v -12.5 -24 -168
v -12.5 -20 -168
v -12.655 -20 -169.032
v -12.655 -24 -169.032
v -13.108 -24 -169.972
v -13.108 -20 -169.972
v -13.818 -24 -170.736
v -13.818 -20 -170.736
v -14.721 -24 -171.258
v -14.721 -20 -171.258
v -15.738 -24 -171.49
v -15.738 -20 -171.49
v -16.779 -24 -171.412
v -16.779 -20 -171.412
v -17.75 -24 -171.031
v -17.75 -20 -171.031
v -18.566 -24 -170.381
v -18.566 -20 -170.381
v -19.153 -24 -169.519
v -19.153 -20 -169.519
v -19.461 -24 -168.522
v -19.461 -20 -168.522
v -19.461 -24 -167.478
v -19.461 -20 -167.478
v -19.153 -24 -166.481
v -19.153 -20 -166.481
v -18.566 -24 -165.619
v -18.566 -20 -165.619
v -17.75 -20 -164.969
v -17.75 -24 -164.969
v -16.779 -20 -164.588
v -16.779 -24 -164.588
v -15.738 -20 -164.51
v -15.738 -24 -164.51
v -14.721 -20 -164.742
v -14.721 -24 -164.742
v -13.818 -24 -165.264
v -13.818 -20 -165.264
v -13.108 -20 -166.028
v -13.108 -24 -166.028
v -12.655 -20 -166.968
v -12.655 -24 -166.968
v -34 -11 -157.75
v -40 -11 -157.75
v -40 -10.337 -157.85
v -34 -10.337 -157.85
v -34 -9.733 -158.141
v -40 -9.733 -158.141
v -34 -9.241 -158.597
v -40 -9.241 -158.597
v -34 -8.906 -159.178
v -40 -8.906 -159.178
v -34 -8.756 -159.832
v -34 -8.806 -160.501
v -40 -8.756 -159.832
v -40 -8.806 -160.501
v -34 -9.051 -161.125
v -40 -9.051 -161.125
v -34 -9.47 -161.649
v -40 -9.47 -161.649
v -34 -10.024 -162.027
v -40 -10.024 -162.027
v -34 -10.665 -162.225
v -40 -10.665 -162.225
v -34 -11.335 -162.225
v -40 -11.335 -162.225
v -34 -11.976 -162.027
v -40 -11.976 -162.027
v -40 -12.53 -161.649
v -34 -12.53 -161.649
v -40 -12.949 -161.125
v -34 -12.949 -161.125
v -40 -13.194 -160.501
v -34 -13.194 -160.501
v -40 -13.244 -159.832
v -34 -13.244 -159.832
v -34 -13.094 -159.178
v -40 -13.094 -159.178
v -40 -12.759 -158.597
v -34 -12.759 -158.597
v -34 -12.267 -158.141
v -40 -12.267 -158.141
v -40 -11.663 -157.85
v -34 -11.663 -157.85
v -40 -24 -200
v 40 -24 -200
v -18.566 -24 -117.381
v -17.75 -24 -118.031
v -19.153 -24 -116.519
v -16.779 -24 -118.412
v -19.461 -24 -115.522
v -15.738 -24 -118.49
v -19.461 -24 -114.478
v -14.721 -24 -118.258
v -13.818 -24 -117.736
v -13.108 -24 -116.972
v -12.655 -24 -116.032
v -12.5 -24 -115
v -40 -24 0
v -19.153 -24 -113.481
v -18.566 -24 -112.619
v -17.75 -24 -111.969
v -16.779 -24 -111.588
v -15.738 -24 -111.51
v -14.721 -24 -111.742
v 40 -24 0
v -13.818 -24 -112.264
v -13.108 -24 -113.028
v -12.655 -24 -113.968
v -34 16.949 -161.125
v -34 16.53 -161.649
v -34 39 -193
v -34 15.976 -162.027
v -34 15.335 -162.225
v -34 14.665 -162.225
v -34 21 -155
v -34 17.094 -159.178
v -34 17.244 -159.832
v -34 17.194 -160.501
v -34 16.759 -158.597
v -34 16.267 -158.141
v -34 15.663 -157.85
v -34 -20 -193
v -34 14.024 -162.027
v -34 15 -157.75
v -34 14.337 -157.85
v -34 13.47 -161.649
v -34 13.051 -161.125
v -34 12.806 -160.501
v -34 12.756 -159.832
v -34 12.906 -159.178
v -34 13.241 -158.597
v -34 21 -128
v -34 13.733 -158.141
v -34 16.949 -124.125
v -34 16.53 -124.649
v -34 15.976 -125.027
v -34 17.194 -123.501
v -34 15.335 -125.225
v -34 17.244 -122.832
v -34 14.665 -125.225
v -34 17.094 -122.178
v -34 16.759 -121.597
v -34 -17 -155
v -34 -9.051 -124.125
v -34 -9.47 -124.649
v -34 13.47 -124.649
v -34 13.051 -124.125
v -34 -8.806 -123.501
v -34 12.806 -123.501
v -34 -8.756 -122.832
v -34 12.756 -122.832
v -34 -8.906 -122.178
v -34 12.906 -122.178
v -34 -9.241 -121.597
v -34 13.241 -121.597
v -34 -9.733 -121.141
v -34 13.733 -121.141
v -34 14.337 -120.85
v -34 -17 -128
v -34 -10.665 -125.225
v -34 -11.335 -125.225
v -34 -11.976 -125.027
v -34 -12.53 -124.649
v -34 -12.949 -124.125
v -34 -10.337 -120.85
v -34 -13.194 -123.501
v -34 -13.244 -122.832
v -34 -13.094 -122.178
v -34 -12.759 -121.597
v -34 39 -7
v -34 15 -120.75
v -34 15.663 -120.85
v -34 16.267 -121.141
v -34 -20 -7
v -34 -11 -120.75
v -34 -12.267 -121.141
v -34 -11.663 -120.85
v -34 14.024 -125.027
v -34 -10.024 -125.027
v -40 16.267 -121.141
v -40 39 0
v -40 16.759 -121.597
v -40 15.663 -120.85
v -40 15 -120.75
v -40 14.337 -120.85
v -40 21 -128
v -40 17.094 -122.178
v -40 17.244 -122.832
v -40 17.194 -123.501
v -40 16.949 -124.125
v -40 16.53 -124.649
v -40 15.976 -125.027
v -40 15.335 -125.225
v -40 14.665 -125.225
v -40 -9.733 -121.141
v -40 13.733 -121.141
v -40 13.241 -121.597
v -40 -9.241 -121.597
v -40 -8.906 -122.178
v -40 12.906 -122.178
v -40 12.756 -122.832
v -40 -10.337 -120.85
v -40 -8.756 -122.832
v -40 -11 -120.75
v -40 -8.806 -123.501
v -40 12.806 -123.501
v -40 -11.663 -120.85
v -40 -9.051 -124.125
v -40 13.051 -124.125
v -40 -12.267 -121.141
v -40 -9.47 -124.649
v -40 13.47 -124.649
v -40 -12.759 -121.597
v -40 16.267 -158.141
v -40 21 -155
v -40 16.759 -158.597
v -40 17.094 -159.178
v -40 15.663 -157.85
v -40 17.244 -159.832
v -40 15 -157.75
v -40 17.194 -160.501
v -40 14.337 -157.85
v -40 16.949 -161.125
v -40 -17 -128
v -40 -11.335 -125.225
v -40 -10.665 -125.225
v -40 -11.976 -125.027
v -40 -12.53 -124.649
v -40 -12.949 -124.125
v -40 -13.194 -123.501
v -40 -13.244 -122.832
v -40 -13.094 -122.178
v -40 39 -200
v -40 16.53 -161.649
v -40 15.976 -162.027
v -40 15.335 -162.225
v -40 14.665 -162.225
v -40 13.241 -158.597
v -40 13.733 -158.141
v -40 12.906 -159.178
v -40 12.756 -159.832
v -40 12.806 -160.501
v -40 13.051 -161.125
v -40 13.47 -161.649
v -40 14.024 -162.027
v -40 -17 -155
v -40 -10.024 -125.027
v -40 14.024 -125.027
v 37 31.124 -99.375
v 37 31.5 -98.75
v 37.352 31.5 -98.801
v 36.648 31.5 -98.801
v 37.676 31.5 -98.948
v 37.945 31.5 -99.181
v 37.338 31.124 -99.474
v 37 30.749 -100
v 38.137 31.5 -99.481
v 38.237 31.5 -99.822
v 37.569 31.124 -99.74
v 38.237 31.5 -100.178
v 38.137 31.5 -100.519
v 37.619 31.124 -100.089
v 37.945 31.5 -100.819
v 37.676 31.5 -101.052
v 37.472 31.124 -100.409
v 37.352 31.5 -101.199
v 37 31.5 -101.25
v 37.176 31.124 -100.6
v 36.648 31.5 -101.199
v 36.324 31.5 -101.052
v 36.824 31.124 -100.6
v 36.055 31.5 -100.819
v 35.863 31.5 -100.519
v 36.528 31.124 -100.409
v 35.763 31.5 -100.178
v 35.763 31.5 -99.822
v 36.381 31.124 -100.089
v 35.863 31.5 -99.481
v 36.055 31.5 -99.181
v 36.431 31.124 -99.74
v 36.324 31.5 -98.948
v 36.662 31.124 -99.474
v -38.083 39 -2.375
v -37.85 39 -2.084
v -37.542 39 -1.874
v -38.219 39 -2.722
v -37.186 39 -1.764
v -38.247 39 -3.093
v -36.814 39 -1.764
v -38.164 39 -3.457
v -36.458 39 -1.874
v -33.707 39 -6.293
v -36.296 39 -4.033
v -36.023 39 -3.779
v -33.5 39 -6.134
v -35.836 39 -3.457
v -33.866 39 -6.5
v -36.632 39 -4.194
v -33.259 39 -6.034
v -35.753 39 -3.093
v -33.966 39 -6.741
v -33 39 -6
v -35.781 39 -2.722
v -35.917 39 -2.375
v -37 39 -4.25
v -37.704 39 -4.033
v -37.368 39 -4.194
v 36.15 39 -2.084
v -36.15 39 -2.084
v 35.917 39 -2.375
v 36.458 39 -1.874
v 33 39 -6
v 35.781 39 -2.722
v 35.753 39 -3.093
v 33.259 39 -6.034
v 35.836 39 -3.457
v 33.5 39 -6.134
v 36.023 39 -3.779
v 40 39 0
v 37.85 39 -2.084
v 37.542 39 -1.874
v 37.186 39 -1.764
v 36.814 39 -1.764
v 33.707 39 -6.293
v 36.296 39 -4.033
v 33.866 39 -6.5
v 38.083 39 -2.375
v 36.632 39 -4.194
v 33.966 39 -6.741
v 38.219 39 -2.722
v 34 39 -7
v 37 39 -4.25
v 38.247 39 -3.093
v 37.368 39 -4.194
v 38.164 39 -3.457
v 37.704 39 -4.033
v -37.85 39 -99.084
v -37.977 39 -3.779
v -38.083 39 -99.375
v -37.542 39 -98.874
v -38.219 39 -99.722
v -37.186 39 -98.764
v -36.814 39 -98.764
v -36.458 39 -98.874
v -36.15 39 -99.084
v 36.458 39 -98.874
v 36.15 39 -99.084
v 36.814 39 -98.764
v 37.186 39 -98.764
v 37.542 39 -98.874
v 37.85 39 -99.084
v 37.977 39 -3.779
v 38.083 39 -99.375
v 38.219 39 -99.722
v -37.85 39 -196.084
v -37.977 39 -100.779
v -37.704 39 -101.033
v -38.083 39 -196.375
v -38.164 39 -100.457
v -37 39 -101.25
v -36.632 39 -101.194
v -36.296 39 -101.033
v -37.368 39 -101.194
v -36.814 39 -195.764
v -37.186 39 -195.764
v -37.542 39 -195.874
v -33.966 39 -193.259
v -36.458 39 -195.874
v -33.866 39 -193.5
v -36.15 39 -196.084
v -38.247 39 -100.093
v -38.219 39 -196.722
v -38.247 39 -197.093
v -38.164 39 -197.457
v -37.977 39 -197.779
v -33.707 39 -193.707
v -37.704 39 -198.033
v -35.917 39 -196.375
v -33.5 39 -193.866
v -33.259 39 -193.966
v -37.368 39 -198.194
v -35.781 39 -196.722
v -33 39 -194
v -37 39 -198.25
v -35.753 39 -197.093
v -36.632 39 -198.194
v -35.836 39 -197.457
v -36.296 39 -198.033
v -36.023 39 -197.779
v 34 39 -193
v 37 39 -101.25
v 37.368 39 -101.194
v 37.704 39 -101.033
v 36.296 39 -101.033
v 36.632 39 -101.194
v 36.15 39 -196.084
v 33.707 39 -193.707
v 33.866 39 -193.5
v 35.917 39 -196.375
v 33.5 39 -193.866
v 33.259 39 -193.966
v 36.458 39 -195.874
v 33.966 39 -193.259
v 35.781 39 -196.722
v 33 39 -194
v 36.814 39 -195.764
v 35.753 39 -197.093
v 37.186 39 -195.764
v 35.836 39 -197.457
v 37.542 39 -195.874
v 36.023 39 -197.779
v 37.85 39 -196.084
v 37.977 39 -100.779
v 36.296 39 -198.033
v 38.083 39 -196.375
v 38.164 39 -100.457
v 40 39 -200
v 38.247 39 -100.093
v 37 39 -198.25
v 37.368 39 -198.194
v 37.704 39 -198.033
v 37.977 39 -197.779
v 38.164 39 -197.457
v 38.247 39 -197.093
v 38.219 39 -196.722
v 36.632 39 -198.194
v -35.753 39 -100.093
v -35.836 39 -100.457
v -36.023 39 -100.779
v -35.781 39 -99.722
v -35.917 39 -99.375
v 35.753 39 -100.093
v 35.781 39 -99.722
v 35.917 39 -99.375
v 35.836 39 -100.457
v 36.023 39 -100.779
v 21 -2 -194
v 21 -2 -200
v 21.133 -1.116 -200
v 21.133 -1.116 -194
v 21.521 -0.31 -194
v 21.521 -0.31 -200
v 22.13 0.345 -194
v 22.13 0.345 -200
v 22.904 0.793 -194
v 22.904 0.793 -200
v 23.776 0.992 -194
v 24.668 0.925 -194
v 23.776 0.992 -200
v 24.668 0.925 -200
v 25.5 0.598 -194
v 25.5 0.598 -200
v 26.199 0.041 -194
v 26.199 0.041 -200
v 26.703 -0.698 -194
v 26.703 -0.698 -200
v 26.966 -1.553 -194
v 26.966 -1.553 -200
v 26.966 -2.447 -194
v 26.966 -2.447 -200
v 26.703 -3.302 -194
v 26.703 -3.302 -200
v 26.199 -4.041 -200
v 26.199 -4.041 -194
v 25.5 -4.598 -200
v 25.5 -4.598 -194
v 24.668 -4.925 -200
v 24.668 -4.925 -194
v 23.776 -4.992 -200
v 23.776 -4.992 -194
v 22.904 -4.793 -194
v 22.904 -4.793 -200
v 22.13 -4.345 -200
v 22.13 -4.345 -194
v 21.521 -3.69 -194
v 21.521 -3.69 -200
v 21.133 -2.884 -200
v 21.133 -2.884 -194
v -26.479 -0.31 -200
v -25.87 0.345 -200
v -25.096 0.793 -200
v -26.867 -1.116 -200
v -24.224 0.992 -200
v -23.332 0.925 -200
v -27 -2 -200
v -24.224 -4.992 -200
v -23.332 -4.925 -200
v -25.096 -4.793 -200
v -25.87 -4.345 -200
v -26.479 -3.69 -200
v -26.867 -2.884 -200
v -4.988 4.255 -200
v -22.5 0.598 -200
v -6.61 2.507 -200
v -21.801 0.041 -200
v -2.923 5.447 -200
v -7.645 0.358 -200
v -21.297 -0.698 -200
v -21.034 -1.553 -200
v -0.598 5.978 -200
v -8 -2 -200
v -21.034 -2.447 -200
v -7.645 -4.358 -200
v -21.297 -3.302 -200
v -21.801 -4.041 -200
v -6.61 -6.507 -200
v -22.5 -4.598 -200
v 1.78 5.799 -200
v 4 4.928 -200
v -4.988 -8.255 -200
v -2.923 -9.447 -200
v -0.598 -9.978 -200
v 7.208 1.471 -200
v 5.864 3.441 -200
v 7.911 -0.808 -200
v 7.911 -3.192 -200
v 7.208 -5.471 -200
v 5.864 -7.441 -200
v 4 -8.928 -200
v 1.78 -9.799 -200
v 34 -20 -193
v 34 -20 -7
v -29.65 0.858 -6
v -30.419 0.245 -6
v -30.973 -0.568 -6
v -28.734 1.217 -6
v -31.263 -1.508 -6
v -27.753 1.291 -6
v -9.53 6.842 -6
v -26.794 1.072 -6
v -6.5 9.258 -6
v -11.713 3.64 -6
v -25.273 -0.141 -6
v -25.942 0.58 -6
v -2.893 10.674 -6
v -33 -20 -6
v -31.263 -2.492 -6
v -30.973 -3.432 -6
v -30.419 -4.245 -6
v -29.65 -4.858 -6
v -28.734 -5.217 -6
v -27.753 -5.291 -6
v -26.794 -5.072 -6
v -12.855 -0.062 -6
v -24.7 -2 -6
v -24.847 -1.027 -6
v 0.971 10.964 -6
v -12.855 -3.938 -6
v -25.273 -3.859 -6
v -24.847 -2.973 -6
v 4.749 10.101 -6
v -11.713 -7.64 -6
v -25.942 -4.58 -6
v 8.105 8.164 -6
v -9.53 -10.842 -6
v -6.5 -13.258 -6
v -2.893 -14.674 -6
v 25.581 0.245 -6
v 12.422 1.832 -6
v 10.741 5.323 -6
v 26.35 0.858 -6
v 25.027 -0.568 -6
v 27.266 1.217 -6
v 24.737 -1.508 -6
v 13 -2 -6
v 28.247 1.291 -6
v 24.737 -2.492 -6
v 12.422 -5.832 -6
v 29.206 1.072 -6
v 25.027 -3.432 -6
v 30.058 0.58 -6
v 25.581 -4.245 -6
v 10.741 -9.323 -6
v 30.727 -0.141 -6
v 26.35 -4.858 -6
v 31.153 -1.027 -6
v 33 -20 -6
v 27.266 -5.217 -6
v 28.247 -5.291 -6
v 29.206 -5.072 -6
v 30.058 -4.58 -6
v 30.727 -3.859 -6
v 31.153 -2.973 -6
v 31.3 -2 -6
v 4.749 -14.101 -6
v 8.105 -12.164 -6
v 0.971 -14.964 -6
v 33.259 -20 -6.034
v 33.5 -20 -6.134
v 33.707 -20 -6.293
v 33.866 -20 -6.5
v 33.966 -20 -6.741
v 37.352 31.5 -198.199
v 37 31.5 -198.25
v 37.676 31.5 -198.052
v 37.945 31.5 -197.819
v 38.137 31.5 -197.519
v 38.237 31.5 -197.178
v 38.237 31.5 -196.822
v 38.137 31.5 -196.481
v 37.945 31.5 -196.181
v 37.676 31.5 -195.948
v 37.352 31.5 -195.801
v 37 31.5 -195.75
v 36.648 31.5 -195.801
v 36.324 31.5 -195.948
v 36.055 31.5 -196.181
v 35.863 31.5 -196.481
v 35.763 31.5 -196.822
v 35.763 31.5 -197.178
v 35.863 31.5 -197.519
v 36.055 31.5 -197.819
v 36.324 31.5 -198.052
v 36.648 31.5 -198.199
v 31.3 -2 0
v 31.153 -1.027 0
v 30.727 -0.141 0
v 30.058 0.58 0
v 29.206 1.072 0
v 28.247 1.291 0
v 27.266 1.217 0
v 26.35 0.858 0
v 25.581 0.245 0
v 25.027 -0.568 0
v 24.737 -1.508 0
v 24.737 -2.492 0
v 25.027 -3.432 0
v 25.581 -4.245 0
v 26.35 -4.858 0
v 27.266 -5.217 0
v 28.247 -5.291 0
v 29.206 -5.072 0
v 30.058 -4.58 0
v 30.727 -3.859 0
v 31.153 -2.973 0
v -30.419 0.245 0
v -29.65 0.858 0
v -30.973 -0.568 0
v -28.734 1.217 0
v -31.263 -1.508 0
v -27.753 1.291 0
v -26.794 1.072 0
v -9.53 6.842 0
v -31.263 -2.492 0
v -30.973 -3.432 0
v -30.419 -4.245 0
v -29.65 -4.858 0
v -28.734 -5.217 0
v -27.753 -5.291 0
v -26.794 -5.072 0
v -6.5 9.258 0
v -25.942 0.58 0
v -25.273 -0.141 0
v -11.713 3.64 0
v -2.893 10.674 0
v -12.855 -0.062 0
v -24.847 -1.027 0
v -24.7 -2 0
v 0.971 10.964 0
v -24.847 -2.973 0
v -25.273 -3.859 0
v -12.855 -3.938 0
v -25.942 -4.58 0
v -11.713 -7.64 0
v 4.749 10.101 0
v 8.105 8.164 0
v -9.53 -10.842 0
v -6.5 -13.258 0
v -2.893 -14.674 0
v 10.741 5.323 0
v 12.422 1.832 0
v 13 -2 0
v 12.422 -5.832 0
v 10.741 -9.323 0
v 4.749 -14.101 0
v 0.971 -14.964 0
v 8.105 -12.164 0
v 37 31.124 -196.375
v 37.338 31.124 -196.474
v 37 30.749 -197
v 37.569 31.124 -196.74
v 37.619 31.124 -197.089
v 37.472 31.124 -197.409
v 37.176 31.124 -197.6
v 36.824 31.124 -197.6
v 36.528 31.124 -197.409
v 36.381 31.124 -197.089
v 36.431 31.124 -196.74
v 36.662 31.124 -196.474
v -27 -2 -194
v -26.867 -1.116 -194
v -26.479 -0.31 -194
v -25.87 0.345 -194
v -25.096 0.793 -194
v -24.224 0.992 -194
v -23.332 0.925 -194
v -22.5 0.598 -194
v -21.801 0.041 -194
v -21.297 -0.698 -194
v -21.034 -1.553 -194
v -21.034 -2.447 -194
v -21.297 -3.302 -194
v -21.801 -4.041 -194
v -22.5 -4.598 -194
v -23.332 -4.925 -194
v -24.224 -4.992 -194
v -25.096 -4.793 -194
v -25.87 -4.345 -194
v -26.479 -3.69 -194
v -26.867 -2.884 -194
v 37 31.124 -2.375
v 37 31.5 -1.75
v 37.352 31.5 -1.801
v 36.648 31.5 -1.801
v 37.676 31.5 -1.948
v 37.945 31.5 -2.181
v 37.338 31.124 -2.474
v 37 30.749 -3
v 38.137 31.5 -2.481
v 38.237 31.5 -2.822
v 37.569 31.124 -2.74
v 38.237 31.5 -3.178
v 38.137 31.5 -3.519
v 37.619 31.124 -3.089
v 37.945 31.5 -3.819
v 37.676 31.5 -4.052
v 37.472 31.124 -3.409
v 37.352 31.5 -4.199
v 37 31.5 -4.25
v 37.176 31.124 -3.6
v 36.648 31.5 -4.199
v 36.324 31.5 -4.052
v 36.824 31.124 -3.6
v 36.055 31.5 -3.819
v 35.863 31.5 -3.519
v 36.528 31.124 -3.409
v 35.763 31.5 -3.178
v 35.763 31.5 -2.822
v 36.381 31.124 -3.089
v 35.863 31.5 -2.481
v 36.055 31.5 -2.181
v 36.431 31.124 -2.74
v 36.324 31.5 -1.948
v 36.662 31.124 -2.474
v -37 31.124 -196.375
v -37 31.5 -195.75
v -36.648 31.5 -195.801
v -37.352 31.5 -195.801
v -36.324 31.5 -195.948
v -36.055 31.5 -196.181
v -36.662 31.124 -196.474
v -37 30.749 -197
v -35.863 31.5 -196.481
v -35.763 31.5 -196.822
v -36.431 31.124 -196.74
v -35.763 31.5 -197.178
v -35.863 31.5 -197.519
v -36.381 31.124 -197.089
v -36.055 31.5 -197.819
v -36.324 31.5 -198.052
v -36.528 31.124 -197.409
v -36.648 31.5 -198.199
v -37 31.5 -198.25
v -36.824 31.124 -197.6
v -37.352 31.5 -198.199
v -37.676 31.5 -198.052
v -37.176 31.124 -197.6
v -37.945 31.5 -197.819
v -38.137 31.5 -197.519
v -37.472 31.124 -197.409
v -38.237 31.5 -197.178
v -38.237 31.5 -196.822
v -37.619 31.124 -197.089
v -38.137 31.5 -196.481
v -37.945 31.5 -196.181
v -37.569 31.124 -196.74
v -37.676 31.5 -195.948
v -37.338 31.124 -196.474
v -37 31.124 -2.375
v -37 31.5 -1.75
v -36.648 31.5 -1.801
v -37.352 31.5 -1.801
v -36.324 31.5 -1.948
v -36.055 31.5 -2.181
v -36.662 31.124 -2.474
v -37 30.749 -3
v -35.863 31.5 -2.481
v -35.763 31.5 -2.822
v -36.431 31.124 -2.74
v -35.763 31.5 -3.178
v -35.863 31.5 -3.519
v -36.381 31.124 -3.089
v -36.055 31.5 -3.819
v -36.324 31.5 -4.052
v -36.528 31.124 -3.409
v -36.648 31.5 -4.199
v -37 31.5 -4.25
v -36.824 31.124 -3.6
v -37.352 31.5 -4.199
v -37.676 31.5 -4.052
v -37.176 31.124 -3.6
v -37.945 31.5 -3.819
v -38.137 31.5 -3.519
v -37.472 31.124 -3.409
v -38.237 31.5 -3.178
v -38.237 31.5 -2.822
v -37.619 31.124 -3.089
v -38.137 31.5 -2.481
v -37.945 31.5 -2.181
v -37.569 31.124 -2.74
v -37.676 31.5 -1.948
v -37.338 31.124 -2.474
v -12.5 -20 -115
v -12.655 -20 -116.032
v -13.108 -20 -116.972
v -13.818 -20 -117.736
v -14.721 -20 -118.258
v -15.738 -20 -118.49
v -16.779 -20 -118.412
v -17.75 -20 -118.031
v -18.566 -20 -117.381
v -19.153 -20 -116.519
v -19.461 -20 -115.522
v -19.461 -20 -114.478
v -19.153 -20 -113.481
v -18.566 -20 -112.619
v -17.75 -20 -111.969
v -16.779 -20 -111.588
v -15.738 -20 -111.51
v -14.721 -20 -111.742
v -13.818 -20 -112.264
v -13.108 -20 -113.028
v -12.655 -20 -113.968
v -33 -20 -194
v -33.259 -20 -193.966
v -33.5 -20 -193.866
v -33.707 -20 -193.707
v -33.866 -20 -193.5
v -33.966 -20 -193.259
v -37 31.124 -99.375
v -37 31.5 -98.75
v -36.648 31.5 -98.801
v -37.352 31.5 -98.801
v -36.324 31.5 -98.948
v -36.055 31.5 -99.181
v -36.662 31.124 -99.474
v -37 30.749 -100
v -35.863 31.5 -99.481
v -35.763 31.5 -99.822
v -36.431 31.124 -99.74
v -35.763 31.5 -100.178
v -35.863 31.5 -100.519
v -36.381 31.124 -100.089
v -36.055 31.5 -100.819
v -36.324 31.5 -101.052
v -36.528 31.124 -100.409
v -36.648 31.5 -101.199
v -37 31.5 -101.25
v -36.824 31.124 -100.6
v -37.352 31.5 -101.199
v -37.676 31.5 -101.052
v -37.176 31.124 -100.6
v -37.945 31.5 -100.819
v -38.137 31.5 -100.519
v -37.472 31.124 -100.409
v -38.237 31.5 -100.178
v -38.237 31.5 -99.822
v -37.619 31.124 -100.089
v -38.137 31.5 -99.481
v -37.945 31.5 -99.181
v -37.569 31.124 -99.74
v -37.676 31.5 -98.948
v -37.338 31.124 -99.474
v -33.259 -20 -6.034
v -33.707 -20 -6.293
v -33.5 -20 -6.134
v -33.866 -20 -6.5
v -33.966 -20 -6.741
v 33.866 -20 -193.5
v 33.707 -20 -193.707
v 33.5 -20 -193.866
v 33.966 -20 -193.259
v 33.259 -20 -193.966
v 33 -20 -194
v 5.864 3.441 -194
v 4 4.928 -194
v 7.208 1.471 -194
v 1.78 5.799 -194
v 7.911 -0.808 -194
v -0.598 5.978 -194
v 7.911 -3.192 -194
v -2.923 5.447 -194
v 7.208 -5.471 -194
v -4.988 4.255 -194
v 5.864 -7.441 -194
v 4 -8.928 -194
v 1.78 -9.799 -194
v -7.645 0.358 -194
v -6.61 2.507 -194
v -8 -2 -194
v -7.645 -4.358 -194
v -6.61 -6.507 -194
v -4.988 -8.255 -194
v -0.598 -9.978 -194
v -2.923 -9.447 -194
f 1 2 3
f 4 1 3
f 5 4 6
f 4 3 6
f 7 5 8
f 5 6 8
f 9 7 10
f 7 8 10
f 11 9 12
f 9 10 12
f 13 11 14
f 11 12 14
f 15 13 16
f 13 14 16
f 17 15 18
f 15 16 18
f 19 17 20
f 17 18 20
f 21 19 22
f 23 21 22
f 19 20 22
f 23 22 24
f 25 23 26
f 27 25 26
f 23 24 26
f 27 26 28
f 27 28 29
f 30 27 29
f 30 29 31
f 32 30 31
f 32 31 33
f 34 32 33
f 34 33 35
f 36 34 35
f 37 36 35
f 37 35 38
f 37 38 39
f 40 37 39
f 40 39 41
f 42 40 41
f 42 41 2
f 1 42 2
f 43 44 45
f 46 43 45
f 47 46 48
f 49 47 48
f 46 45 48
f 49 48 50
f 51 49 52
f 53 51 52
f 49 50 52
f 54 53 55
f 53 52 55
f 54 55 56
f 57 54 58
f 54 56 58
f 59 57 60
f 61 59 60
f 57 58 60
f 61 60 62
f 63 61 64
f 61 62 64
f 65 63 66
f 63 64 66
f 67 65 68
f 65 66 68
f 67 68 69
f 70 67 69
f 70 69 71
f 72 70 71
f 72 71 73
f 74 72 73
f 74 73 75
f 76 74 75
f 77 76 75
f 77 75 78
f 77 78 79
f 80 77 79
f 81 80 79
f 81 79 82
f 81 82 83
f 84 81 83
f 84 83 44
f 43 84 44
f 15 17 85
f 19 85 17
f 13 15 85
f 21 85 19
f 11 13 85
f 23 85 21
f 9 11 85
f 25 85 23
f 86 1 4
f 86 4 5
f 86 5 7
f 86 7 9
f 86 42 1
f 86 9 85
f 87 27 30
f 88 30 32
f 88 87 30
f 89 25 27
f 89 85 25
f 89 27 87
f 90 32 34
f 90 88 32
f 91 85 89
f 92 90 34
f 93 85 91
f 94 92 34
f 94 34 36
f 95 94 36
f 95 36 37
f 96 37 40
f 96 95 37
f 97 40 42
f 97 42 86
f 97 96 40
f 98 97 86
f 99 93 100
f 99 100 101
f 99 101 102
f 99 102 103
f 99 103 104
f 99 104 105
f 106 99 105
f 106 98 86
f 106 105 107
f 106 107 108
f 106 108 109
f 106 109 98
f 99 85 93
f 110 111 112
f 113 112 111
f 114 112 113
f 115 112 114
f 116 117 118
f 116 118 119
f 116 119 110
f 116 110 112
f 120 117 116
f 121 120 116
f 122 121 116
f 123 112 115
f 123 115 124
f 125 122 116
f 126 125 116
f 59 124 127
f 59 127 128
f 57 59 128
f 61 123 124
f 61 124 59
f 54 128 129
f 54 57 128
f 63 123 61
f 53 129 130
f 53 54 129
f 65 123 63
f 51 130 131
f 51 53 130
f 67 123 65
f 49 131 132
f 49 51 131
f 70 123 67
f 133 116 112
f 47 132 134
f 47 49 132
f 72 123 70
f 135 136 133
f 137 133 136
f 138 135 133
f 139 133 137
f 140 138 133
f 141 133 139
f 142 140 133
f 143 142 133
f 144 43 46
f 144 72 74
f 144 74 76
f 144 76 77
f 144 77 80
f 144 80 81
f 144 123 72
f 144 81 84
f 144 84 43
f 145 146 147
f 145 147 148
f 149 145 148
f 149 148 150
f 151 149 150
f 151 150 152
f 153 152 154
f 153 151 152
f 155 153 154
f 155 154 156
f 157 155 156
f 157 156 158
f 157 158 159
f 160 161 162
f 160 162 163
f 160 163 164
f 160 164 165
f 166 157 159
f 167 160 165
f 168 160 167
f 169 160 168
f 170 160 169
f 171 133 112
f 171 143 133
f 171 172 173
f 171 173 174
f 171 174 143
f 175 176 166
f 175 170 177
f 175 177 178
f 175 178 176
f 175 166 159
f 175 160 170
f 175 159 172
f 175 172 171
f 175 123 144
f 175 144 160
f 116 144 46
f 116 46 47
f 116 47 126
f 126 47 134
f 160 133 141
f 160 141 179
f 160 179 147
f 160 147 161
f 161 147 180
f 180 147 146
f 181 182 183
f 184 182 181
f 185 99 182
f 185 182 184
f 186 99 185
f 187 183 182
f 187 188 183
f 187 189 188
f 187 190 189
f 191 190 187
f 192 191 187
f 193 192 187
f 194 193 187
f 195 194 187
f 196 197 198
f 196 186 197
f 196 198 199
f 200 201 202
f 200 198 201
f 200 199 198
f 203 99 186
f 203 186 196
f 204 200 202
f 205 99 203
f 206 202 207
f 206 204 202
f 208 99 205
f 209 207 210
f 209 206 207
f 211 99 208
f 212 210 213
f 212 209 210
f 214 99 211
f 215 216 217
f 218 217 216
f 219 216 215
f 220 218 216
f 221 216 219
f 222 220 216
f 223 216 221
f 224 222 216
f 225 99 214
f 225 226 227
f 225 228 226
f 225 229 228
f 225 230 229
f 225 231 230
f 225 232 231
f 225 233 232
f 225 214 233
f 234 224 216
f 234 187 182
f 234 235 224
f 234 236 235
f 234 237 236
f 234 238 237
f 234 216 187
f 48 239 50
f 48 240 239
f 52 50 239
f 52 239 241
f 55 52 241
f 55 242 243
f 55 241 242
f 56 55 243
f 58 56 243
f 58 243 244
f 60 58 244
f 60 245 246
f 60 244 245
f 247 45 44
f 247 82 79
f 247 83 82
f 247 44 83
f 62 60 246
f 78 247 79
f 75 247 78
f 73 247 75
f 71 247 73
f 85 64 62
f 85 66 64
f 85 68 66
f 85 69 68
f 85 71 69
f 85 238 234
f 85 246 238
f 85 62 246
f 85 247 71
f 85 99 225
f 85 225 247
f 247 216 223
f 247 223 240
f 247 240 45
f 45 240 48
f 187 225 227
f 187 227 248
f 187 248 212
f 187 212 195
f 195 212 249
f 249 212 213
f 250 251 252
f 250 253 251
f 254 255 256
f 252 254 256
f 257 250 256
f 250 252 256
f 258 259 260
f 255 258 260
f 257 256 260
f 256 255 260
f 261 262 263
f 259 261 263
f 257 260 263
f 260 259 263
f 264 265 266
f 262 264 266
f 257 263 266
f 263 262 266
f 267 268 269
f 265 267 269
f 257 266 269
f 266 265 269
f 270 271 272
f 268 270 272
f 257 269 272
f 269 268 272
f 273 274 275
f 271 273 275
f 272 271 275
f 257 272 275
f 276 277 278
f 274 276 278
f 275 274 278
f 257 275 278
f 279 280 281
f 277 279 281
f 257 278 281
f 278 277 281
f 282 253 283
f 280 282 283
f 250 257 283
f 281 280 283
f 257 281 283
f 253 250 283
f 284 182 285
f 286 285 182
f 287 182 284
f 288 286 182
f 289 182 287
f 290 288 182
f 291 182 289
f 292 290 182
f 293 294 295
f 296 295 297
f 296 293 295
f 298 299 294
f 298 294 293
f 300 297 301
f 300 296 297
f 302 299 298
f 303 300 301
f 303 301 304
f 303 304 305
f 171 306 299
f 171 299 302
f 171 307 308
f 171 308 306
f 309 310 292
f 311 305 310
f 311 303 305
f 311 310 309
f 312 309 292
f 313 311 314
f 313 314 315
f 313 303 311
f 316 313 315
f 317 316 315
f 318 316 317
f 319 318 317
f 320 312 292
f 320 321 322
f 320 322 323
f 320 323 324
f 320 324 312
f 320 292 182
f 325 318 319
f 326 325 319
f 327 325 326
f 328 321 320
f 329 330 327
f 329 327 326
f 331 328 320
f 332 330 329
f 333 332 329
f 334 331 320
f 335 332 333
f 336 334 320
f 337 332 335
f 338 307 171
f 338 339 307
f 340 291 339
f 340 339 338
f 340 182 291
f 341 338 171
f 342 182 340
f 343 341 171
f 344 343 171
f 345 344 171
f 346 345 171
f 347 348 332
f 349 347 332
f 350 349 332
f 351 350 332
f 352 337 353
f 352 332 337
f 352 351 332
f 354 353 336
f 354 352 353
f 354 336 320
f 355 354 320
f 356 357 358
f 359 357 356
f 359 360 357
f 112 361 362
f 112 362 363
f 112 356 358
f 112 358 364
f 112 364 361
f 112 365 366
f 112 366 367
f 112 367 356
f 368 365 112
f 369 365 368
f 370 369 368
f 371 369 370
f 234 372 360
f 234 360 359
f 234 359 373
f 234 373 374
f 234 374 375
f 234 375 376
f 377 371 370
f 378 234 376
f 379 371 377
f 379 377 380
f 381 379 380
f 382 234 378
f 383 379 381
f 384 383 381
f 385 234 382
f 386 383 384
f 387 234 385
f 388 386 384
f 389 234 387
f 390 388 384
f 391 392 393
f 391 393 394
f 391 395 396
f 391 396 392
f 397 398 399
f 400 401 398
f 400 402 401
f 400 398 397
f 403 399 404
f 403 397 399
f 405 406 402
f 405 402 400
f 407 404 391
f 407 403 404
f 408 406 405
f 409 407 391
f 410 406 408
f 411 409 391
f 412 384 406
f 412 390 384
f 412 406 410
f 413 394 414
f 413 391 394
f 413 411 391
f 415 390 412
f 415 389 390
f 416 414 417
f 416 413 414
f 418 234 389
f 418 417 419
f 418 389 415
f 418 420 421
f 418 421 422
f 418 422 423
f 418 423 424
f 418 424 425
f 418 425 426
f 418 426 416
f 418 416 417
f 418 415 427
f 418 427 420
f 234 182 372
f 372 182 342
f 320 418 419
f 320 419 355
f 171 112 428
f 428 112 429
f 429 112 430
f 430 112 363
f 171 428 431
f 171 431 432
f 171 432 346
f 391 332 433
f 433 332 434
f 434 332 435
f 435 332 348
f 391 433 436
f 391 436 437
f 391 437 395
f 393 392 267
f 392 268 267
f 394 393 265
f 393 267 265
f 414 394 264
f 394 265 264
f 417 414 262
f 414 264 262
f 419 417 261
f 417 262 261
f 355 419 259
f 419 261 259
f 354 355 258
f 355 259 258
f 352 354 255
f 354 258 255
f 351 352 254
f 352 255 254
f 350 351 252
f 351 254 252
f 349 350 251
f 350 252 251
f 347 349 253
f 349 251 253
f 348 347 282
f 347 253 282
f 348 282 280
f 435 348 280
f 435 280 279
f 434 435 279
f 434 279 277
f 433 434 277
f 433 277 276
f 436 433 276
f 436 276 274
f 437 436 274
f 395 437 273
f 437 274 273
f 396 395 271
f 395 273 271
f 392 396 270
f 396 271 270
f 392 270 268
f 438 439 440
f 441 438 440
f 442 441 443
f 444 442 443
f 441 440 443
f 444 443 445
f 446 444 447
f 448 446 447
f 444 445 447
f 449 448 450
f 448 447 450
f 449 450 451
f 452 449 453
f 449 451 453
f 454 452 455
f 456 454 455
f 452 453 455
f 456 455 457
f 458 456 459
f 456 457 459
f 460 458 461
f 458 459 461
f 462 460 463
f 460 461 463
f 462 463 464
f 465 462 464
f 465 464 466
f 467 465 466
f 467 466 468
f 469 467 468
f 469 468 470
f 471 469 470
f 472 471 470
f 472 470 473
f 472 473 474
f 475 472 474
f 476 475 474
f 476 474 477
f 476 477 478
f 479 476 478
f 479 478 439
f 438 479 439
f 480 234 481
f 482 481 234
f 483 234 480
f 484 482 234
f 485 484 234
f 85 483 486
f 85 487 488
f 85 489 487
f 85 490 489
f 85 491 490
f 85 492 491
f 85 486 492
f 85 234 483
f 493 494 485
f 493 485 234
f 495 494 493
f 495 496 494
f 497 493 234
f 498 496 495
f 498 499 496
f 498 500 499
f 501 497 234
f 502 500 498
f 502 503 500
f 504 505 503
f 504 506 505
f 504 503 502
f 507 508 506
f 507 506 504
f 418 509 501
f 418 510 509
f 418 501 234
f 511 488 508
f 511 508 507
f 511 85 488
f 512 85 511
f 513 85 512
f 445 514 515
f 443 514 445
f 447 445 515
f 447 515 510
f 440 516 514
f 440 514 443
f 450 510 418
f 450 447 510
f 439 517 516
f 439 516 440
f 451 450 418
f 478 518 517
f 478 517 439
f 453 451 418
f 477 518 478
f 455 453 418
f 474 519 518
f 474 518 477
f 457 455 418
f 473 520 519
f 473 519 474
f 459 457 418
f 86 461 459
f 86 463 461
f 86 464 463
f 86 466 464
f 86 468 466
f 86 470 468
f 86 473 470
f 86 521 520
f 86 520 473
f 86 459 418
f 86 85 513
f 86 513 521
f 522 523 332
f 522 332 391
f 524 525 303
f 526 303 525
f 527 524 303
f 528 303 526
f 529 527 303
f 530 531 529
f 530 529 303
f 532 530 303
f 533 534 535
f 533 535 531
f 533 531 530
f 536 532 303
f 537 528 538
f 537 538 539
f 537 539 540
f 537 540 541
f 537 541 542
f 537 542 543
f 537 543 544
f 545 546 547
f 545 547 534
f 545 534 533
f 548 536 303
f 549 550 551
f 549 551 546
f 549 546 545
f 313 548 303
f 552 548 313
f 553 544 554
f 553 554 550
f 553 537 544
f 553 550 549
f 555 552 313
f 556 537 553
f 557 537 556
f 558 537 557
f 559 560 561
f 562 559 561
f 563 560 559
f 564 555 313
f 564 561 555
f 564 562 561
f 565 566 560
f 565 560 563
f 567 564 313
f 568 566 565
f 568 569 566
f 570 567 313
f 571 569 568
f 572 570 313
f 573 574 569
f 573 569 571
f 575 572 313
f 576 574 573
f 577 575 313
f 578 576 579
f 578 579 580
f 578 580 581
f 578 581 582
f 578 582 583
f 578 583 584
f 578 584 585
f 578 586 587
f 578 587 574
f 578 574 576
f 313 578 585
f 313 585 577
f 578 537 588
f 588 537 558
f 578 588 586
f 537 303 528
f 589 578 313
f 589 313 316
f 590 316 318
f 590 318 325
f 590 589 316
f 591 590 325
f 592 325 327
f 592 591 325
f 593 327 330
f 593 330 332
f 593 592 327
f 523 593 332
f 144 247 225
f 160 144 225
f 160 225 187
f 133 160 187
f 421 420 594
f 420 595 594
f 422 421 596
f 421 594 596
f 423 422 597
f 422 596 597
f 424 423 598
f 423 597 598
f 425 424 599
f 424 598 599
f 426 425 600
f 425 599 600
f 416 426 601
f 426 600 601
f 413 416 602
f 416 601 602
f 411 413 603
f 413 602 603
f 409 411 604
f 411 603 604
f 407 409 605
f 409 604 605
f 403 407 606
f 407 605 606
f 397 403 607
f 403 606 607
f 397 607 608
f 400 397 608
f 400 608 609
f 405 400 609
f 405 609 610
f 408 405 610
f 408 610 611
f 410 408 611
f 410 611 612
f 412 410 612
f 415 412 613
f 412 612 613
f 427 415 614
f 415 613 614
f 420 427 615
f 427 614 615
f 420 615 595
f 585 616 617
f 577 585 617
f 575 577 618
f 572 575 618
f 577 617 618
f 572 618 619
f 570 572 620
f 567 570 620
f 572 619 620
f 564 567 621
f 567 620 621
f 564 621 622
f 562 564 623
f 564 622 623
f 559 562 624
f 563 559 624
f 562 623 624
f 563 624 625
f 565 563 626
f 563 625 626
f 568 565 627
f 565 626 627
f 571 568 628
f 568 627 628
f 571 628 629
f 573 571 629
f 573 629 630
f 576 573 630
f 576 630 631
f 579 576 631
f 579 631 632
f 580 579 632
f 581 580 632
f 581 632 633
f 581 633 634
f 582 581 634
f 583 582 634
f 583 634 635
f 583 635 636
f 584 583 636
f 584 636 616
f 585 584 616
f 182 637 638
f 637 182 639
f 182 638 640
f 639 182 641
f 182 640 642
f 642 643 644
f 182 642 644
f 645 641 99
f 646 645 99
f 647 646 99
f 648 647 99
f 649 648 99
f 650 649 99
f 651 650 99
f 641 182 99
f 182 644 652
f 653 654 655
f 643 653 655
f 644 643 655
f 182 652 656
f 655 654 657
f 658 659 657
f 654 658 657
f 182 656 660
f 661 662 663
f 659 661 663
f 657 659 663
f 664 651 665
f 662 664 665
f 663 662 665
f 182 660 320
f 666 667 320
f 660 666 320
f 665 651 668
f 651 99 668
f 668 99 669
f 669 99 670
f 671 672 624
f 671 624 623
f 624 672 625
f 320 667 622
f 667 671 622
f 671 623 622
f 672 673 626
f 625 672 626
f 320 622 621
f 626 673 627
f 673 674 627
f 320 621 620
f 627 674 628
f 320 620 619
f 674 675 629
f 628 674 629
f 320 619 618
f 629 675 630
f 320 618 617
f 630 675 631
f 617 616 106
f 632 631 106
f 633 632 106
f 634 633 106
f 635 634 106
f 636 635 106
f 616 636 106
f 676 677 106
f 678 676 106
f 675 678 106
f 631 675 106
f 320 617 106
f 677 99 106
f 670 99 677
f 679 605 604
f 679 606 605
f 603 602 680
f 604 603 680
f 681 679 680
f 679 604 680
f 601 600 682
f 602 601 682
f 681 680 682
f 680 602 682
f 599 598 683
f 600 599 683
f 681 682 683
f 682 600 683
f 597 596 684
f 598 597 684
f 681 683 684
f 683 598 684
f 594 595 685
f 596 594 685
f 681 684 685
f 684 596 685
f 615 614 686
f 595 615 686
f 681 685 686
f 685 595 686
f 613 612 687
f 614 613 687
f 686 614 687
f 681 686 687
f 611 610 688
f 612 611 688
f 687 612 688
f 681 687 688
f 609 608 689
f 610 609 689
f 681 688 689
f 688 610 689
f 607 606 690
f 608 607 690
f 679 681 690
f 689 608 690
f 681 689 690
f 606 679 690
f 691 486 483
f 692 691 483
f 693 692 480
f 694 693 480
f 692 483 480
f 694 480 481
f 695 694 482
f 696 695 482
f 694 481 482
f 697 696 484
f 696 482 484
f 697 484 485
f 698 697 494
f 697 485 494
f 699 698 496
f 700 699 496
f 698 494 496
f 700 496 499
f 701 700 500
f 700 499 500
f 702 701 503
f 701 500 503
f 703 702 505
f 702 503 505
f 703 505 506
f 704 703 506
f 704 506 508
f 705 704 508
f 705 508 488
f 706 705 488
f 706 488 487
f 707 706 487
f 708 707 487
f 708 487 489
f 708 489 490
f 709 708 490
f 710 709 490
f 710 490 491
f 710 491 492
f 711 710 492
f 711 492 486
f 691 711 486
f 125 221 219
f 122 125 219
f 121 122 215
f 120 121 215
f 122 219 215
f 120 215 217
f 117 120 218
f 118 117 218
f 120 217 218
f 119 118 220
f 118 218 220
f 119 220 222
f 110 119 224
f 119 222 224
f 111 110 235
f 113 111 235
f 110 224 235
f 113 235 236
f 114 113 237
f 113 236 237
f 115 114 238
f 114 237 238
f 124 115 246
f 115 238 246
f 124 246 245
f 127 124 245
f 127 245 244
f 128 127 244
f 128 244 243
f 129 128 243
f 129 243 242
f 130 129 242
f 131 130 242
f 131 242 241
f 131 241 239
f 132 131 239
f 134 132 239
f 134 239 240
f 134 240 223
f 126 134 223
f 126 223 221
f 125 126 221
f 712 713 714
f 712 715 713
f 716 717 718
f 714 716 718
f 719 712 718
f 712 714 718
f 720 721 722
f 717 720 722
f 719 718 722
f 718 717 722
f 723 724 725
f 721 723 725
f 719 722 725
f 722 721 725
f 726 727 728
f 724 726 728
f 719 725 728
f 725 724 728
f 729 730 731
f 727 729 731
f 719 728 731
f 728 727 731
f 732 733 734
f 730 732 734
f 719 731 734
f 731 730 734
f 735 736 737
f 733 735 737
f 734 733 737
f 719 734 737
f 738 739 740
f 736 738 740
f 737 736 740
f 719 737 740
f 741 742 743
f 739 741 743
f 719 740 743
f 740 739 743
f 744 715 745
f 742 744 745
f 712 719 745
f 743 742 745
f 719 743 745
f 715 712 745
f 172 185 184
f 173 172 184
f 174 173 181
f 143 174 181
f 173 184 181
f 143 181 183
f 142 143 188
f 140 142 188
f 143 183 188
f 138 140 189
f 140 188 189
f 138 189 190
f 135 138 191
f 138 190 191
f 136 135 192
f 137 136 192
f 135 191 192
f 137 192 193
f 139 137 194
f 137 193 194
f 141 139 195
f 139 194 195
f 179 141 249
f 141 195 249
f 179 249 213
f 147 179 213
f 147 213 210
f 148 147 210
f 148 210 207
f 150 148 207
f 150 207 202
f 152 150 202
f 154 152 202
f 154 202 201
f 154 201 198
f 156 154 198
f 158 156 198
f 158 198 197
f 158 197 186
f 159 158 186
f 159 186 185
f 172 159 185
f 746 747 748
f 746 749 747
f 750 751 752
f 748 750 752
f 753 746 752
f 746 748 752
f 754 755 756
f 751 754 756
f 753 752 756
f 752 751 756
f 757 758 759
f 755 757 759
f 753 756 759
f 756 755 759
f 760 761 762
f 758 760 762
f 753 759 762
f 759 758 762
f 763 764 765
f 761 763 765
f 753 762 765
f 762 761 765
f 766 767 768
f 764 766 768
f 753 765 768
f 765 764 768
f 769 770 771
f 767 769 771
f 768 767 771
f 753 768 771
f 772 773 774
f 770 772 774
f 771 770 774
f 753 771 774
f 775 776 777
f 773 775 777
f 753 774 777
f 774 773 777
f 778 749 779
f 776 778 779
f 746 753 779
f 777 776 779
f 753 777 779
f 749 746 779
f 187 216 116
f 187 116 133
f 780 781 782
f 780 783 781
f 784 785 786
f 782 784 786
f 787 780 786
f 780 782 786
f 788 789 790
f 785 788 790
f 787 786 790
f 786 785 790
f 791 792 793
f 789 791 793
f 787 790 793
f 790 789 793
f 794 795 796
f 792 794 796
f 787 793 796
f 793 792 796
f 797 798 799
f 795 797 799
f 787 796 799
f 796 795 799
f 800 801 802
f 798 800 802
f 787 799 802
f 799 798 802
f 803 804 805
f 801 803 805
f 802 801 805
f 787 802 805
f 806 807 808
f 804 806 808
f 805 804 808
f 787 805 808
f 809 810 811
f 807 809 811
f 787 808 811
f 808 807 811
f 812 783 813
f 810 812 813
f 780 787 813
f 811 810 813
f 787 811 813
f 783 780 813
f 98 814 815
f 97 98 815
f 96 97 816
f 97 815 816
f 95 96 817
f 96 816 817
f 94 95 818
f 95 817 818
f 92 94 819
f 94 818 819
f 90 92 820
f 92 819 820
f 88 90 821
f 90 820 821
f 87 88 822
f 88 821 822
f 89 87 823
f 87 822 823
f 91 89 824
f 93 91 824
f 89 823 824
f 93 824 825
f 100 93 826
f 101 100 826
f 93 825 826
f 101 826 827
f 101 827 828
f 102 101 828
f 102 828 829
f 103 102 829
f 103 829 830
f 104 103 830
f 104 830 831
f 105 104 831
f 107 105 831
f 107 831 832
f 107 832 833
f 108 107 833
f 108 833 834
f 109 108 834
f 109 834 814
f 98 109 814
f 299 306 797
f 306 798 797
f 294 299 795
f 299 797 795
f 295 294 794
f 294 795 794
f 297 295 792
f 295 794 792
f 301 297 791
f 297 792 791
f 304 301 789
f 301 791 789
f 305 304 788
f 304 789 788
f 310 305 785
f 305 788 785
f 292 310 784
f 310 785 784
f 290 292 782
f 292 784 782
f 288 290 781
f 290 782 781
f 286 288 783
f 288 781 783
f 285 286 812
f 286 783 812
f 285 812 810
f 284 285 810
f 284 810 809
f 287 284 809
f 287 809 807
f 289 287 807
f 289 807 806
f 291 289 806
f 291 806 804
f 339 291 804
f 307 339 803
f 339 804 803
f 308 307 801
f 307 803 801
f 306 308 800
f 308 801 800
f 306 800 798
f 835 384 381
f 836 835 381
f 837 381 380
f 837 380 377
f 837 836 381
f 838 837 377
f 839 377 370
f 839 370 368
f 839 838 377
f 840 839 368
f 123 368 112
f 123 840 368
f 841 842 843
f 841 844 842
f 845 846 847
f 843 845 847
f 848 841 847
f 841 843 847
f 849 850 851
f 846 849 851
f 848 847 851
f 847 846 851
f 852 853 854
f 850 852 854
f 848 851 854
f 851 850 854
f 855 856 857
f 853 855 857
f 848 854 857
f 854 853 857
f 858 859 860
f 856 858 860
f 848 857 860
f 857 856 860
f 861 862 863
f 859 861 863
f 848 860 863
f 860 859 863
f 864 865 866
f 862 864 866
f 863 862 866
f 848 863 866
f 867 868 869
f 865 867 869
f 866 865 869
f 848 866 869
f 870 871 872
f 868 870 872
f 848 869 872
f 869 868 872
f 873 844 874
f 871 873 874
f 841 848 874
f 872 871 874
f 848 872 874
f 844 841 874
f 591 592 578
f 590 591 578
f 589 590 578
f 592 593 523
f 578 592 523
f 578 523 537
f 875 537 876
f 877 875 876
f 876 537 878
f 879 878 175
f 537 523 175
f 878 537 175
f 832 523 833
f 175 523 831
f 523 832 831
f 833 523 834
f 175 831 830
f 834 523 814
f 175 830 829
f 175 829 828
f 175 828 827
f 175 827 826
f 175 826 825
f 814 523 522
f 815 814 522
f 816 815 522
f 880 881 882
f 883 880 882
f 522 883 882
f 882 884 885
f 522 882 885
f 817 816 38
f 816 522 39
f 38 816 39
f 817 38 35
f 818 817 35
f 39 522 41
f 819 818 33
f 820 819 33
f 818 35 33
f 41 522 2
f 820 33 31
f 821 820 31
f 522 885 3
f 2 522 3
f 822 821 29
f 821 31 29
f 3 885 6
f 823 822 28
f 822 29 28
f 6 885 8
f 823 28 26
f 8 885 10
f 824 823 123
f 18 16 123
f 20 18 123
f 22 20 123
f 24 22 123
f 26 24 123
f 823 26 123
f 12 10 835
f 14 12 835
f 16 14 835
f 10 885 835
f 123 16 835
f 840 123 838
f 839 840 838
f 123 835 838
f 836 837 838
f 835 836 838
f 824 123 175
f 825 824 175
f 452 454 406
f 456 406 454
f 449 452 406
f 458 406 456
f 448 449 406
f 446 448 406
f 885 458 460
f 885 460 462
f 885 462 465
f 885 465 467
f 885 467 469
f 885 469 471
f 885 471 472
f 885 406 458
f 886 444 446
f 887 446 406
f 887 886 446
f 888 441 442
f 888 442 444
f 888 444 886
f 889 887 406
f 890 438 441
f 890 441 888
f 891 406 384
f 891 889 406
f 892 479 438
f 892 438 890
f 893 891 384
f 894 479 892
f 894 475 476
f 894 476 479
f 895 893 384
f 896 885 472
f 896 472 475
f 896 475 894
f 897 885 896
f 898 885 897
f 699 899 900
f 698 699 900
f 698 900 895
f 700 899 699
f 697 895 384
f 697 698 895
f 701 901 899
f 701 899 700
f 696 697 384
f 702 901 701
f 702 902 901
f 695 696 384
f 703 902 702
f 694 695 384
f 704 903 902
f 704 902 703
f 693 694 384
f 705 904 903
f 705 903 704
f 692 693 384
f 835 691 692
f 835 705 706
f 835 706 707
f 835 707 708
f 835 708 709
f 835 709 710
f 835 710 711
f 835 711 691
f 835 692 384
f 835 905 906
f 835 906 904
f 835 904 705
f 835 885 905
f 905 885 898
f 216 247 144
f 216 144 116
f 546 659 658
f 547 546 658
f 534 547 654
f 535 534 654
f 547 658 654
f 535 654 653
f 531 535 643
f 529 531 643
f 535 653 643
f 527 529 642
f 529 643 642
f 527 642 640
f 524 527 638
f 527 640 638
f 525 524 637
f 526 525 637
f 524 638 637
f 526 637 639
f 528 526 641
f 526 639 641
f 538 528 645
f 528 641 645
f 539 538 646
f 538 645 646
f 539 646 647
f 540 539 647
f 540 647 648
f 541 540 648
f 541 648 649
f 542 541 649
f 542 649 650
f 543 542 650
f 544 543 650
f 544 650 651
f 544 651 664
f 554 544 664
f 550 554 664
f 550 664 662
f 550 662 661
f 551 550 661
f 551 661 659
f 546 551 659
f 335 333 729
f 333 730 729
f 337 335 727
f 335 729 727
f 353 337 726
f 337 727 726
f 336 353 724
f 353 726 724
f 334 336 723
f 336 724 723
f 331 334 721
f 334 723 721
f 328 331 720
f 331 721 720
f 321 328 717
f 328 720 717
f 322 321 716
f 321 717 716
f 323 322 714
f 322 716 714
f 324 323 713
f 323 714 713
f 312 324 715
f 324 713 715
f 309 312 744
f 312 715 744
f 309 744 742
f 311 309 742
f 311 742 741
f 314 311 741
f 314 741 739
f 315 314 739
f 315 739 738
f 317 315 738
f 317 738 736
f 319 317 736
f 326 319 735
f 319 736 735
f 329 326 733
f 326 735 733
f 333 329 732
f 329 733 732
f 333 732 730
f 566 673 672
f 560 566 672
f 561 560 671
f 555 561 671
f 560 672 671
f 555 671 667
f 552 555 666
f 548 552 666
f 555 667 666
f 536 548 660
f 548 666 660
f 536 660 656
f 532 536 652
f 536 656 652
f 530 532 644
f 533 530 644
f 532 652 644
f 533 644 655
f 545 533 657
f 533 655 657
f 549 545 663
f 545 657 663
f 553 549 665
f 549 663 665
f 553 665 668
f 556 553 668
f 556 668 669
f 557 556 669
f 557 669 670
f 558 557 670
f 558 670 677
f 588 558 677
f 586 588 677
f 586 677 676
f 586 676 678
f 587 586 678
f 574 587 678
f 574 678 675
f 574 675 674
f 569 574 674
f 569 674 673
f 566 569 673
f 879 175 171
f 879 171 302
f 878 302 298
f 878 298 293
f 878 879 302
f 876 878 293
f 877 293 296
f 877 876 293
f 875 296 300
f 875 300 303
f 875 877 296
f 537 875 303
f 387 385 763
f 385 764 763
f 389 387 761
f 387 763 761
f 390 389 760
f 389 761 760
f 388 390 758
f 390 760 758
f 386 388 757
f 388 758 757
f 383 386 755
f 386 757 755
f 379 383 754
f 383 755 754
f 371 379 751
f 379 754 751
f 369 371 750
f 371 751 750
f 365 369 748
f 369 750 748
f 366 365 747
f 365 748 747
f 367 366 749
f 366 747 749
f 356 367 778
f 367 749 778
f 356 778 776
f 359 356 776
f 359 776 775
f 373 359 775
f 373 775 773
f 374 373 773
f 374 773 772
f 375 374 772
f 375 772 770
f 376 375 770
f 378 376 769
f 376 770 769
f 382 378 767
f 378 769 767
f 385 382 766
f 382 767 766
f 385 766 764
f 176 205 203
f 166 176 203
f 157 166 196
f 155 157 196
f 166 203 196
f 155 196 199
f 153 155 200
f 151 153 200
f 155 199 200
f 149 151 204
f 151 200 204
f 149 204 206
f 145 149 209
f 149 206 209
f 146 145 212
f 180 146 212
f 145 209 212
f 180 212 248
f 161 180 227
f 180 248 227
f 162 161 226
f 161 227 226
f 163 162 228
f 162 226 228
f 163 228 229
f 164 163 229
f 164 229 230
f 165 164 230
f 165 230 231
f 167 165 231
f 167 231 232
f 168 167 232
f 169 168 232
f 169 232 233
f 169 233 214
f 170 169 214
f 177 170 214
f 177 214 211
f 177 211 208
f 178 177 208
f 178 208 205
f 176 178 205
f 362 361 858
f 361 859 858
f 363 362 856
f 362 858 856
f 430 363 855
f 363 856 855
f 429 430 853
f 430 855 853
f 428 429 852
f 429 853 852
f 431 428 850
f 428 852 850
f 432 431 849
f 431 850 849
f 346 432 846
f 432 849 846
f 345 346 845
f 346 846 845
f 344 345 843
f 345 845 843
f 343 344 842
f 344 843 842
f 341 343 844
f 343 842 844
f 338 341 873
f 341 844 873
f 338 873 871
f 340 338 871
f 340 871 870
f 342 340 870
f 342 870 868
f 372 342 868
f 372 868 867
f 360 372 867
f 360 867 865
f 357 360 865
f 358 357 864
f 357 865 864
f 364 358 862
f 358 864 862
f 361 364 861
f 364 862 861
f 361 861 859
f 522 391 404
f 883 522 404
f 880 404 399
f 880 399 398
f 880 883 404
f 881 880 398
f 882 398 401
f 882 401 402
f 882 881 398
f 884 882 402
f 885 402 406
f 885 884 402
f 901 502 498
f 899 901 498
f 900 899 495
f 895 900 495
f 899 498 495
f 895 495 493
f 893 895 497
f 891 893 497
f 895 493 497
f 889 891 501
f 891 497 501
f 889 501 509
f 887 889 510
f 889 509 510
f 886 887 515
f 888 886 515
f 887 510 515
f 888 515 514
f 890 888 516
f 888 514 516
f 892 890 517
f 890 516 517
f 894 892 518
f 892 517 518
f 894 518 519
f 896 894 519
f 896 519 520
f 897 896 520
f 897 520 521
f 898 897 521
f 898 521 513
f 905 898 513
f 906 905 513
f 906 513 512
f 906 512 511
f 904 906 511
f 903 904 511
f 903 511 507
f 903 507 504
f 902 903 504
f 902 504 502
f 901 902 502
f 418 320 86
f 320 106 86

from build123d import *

# Parameters (mm, degrees)
SKETCH_1_W             = 80
SKETCH_1_H             = 48
EXTRUDE_1_DEPTH        = 200
CUT_EXTRUDE_1_DEPTH    = 44
SKETCH_3_R             = 3.3
SKETCH_3_R_2           = 13
CUT_EXTRUDE_2_DEPTH    = 10
SKETCH_4_R             = 2.25
SKETCH_4_W             = 27
SKETCH_4_H             = 38
CUT_EXTRUDE_3_DEPTH    = 10
SKETCH_5_R             = 8
SKETCH_5_R_2           = 3
CUT_EXTRUDE_4_DEPTH    = 10
SKETCH_6_R             = 3.500000002
SKETCH_6_R_2           = 3.5
CUT_EXTRUDE_5_DEPTH    = 10
SKETCH_8_W             = 80
SKETCH_8_H             = 200
EXTRUDE_2_DEPTH        = 15
HOLE_WIZARD_M3_1_D     = 2.5
HOLE_WIZARD_M3_1_DEPTH = 7.5
HOLE_WIZARD_M3_1_TIP   = 0.751075774


with BuildPart() as part:
    # 草图1 → 凸台-拉伸1 (new body)
    with BuildSketch(Plane.XY):
        Rectangle(SKETCH_1_W, SKETCH_1_H)
    extrude(amount=-EXTRUDE_1_DEPTH)

    # 草图2 → 切除-拉伸1 (cut)
    with BuildSketch(Plane(origin=(0, 24, 0), x_dir=(1, 0, 0), z_dir=(0, 1, 0))):
        with BuildLine():
            ThreePointArc((-34, 193), (-33.707106781, 193.707106781), (-33, 194))
            Line((-33, 194), (33, 194))
            ThreePointArc((33, 194), (33.707106781, 193.707106781), (34, 193))
            Line((34, 193), (34, 7))
            ThreePointArc((34, 7), (33.707106781, 6.292893219), (33, 6))
            Line((33, 6), (-33, 6))
            ThreePointArc((-33, 6), (-33.707106781, 6.292893219), (-34, 7))
            Line((-34, 7), (-34, 193))
        make_face()
    extrude(amount=-CUT_EXTRUDE_1_DEPTH, mode=Mode.SUBTRACT)

    # 草图3 → 切除-拉伸2 (cut)
    with BuildSketch(Plane.XY):
        with Locations((-28, -2)):
            Circle(SKETCH_3_R)
        with Locations((0, -2)):
            Circle(SKETCH_3_R_2)
        with Locations((28, -2)):
            Circle(SKETCH_3_R)
    extrude(amount=-CUT_EXTRUDE_2_DEPTH, mode=Mode.SUBTRACT)

    # 草图4 → 切除-拉伸3 (cut)
    with BuildSketch(Plane.ZY.offset(40)):
        with Locations((-123, -11)):
            Circle(SKETCH_4_R)
        with Locations((-123, 15)):
            Circle(SKETCH_4_R)
        with Locations((-160, 15)):
            Circle(SKETCH_4_R)
        with Locations((-160, -11)):
            Circle(SKETCH_4_R)
        with Locations((-141.5, 2)):
            Rectangle(SKETCH_4_W, SKETCH_4_H)
    extrude(amount=-CUT_EXTRUDE_3_DEPTH, mode=Mode.SUBTRACT)

    # 草图5 → 切除-拉伸4 (cut)
    with BuildSketch(Plane(origin=(0, 0, -200), x_dir=(-1, 0, 0), z_dir=(0, 0, -1))):
        with Locations((0, -2)):
            Circle(SKETCH_5_R)
        with Locations((24, -2)):
            Circle(SKETCH_5_R_2)
        with Locations((-24, -2)):
            Circle(SKETCH_5_R_2)
    extrude(amount=-CUT_EXTRUDE_4_DEPTH, mode=Mode.SUBTRACT)

    # 草图6 → 切除-拉伸5 (cut)
    with BuildSketch(Plane(origin=(0, -20, 0), x_dir=(1, 0, 0), z_dir=(0, 1, 0))):
        with Locations((-16, 168)):
            Circle(SKETCH_6_R)
        with Locations((-16, 115)):
            Circle(SKETCH_6_R_2)
    extrude(amount=-CUT_EXTRUDE_5_DEPTH, mode=Mode.SUBTRACT)

    # 草图8 → 凸台-拉伸2 (add)
    with BuildSketch(Plane(origin=(0, 24, 0), x_dir=(1, 0, 0), z_dir=(0, 1, 0))):
        with Locations((0, 100)):
            Rectangle(SKETCH_8_W, SKETCH_8_H)
        with BuildLine():
            Line((-33, 6), (33, 6))
            ThreePointArc((33, 6), (33.707106781, 6.292893219), (34, 7))
            Line((34, 7), (34, 193))
            ThreePointArc((34, 193), (33.707106781, 193.707106781), (33, 194))
            Line((33, 194), (-33, 194))
            ThreePointArc((-33, 194), (-33.707106781, 193.707106781), (-34, 193))
            Line((-34, 193), (-34, 7))
            ThreePointArc((-34, 7), (-33.707106781, 6.292893219), (-33, 6))
        make_face(mode=Mode.SUBTRACT)
    extrude(amount=EXTRUDE_2_DEPTH)

    # M3 螺纹孔1
    with Locations(Plane(origin=(-37, 39, -100), x_dir=(0, 0, 1), z_dir=(0, 1, 0))):
        with Locations((0, 0), (0, 74), (97, 74), (97, 0), (-97, 0), (-97, 74)):
            Hole(HOLE_WIZARD_M3_1_D / 2, depth=HOLE_WIZARD_M3_1_DEPTH)
            with Locations((0, 0, -(HOLE_WIZARD_M3_1_DEPTH + HOLE_WIZARD_M3_1_TIP / 2))):  # 118° drill point
                Cone(0, HOLE_WIZARD_M3_1_D / 2, HOLE_WIZARD_M3_1_TIP, mode=Mode.SUBTRACT)


solid = part.part
